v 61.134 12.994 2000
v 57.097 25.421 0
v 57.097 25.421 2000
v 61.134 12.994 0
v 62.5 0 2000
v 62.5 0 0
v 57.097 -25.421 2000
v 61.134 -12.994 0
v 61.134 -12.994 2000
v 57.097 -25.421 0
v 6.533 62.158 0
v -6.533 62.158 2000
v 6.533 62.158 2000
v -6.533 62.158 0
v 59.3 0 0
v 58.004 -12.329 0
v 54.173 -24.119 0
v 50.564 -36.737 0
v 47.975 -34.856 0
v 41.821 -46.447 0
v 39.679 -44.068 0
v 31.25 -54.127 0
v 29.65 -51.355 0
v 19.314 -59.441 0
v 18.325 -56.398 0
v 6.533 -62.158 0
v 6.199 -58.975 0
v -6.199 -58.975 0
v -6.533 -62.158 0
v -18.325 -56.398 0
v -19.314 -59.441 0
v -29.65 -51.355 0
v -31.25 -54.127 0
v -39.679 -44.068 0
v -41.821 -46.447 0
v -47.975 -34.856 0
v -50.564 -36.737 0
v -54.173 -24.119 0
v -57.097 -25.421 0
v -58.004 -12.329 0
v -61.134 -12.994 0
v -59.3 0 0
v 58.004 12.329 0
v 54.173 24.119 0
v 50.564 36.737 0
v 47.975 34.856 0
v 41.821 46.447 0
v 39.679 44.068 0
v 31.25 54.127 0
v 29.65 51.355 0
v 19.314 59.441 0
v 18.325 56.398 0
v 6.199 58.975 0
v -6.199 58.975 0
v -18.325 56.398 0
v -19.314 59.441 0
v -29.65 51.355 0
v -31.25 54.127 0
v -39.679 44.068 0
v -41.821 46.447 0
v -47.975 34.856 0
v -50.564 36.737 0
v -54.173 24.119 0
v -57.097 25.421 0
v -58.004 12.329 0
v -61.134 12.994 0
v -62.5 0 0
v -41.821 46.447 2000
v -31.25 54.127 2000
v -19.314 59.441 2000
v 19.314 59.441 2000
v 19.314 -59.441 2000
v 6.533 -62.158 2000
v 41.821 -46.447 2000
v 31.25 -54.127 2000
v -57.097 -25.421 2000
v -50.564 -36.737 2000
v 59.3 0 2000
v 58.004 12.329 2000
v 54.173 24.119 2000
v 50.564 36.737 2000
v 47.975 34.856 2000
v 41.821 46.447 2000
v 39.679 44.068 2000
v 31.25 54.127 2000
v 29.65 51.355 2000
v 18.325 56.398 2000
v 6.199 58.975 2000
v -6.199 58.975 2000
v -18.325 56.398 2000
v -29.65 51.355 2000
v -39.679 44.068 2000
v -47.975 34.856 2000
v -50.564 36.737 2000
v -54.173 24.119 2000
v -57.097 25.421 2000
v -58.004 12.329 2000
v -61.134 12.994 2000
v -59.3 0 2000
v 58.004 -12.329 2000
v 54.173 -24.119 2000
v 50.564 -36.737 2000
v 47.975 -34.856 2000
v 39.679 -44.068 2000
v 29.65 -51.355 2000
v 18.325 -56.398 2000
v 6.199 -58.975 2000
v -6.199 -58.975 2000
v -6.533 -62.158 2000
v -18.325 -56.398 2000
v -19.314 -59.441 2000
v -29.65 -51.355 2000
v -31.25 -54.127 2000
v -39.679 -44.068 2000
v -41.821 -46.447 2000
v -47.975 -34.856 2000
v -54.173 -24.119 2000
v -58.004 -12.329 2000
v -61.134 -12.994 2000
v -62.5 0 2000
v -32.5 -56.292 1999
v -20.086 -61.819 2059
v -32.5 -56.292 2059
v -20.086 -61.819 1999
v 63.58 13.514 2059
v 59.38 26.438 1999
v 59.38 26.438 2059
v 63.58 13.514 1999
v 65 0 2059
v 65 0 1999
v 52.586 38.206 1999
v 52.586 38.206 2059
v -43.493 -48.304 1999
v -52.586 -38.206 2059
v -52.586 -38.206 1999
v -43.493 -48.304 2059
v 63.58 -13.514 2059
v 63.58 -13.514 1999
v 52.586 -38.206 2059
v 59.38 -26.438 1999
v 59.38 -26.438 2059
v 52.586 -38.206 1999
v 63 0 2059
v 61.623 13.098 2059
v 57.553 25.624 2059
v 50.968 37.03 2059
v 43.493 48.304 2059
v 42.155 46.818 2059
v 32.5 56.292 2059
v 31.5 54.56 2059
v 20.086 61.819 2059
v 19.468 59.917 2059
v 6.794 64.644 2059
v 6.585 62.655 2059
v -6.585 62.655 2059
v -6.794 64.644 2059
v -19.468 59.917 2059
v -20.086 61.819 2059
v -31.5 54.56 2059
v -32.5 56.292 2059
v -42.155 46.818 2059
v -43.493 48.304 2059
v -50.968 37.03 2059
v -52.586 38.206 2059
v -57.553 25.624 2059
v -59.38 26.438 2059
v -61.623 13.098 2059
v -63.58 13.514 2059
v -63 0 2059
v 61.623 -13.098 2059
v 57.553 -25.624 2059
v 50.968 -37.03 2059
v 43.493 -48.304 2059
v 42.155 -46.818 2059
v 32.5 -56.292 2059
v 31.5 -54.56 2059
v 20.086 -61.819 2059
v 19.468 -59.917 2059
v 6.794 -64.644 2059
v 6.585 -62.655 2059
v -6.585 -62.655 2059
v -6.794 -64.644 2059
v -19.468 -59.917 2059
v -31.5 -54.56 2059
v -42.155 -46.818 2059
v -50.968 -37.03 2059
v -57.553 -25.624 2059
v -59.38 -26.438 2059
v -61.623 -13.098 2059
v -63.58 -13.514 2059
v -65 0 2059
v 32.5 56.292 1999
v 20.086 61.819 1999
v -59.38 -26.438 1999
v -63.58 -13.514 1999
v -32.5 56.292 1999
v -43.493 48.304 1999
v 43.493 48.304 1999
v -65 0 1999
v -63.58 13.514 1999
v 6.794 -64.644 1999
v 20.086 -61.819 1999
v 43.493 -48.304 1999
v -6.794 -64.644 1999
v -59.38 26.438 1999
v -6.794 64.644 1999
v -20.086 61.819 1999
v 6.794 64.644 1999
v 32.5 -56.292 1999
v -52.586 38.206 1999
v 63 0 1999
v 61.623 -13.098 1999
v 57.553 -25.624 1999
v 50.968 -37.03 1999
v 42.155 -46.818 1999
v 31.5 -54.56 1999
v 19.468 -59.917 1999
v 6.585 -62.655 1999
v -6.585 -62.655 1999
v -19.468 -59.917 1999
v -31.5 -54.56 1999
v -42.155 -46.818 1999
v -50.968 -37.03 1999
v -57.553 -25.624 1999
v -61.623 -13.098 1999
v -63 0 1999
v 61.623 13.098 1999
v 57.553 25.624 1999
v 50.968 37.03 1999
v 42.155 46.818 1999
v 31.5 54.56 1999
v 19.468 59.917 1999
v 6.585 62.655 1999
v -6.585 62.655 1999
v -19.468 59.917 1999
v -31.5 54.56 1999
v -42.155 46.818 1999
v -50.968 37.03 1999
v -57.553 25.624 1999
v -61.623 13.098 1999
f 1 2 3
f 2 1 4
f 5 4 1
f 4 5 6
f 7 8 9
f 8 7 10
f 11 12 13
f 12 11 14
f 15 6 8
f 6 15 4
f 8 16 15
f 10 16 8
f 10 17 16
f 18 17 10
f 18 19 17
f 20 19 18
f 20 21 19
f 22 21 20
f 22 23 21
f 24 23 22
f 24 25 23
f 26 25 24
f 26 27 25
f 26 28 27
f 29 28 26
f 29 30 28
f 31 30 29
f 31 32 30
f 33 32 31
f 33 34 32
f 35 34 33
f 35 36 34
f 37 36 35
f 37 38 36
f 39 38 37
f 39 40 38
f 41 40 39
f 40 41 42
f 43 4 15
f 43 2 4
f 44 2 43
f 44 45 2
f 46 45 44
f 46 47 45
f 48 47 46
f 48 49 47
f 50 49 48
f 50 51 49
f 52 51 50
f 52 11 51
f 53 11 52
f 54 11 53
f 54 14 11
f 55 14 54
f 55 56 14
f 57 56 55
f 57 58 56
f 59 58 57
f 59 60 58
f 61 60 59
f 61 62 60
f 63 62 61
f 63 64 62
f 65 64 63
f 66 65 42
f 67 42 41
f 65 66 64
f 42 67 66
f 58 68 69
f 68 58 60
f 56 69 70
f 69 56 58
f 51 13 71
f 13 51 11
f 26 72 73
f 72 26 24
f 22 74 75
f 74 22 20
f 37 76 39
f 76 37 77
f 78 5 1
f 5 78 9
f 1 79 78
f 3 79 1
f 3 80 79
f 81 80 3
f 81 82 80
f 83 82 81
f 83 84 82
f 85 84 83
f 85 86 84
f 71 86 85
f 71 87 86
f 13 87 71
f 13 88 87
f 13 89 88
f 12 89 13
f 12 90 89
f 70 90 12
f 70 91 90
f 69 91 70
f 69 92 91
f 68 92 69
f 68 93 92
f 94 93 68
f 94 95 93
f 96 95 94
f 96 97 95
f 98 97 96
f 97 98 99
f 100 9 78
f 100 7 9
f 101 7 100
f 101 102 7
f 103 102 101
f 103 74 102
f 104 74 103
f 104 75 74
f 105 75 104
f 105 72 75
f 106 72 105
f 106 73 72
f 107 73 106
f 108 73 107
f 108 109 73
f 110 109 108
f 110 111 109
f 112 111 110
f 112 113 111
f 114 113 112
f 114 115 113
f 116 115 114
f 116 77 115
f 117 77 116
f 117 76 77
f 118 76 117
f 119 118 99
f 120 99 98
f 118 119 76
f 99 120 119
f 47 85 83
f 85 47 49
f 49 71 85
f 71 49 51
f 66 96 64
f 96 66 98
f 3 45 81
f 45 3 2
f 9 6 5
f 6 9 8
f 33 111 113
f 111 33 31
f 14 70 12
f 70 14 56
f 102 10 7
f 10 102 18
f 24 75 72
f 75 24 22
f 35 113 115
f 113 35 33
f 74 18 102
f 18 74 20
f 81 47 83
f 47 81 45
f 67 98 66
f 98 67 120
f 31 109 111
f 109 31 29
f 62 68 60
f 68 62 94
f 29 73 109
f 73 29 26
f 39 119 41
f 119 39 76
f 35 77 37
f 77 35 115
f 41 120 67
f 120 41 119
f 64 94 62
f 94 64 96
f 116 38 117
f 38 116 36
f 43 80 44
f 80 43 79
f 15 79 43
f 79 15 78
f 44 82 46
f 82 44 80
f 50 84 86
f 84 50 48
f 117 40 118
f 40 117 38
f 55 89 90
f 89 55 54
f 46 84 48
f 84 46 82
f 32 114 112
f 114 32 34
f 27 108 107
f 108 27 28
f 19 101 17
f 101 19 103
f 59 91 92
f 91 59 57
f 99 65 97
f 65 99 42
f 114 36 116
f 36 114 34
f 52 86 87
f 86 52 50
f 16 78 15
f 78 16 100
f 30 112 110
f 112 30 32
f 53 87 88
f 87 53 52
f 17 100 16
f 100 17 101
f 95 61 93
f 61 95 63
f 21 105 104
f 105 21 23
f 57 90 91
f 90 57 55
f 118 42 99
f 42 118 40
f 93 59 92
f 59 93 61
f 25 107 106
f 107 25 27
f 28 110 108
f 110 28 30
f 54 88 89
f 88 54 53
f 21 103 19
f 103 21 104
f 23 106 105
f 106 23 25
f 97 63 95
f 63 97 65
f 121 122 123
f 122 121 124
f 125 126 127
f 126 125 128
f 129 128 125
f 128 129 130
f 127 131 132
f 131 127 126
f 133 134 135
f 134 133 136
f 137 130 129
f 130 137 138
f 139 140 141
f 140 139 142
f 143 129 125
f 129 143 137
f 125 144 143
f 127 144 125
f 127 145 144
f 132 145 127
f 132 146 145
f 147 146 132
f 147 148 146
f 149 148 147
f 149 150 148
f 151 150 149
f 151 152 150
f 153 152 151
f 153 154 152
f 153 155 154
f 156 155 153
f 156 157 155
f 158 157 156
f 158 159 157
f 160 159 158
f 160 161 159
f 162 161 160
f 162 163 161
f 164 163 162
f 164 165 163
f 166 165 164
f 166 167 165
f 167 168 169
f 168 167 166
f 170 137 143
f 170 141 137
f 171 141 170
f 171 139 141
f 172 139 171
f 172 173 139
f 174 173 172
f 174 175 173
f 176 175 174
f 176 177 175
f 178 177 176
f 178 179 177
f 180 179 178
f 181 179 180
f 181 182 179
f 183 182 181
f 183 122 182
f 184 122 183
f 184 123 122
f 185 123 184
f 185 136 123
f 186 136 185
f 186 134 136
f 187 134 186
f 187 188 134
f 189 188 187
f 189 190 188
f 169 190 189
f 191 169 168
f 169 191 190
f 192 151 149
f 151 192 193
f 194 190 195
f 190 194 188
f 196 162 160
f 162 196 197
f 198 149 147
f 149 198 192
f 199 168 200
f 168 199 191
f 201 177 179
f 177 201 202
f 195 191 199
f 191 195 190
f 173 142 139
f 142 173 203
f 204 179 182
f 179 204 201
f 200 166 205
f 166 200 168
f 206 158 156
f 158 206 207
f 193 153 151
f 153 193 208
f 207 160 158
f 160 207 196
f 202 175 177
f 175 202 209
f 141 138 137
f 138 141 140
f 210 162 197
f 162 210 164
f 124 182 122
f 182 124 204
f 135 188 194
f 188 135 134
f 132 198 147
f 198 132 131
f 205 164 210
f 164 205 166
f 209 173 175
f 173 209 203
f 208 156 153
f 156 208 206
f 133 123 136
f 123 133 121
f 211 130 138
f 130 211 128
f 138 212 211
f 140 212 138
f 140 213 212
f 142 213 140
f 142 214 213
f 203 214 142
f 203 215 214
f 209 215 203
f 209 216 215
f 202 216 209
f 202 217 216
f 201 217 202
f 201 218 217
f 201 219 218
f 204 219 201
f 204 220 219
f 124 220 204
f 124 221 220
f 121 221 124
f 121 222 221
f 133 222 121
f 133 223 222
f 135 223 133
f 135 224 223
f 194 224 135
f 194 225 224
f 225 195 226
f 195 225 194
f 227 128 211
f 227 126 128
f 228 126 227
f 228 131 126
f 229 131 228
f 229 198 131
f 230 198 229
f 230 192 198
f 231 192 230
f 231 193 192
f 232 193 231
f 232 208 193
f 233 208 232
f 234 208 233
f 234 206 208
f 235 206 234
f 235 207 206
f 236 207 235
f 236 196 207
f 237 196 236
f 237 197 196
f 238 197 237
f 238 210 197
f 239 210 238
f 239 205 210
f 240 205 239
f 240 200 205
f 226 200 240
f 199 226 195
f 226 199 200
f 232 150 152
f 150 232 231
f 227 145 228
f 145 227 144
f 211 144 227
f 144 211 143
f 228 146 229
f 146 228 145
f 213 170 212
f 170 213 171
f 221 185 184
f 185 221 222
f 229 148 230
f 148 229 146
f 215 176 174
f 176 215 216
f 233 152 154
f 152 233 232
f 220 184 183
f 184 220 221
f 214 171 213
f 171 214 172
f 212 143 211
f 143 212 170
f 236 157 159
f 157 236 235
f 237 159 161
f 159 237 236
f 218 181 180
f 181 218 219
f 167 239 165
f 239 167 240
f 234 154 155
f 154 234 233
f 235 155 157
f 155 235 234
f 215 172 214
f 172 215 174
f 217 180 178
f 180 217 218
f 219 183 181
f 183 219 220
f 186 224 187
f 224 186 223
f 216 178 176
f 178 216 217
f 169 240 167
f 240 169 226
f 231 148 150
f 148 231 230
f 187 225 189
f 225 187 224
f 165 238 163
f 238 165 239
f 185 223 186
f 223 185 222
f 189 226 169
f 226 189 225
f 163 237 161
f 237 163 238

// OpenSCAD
// Parameters
pipe_standard = 1; //[1:1:1]
nominal_diameter_mm = 125; //[60:250:1]
length_mm = 2000; //[500:4000:10]
wall_thickness_mm = 3.2; //[1.6:6.4:0.1]
socket_length_mm = 60; //[30:120:1]
socket_wall_extra_mm = 2.5; //[1:6:0.1]
socket_overlap_mm = 1; //[0.5:2:0.1]
inner_clearance_mm = 0.5; //[0.2:1.5:0.1]

// HT Pipe - complete geometry
module ht_pipe() {
  color([0.85, 0.85, 0.8]) {
    // Pipe body
    difference() {
      cylinder(h=length_mm, r=nominal_diameter_mm/2, center=false);
      translate([0, 0, 0])
        cylinder(h=length_mm, r=nominal_diameter_mm/2 - wall_thickness_mm, center=false);
    }
    
    // End fitting socket
    difference() {
      translate([0, 0, length_mm - socket_overlap_mm])
        cylinder(h=socket_length_mm, r=nominal_diameter_mm/2 + socket_wall_extra_mm, center=false);
      translate([0, 0, length_mm - socket_overlap_mm])
        cylinder(h=socket_length_mm, r=nominal_diameter_mm/2 + inner_clearance_mm, center=false);
    }
  }
}

// Assembly
module assembly() {
  ht_pipe();
}

assembly();
